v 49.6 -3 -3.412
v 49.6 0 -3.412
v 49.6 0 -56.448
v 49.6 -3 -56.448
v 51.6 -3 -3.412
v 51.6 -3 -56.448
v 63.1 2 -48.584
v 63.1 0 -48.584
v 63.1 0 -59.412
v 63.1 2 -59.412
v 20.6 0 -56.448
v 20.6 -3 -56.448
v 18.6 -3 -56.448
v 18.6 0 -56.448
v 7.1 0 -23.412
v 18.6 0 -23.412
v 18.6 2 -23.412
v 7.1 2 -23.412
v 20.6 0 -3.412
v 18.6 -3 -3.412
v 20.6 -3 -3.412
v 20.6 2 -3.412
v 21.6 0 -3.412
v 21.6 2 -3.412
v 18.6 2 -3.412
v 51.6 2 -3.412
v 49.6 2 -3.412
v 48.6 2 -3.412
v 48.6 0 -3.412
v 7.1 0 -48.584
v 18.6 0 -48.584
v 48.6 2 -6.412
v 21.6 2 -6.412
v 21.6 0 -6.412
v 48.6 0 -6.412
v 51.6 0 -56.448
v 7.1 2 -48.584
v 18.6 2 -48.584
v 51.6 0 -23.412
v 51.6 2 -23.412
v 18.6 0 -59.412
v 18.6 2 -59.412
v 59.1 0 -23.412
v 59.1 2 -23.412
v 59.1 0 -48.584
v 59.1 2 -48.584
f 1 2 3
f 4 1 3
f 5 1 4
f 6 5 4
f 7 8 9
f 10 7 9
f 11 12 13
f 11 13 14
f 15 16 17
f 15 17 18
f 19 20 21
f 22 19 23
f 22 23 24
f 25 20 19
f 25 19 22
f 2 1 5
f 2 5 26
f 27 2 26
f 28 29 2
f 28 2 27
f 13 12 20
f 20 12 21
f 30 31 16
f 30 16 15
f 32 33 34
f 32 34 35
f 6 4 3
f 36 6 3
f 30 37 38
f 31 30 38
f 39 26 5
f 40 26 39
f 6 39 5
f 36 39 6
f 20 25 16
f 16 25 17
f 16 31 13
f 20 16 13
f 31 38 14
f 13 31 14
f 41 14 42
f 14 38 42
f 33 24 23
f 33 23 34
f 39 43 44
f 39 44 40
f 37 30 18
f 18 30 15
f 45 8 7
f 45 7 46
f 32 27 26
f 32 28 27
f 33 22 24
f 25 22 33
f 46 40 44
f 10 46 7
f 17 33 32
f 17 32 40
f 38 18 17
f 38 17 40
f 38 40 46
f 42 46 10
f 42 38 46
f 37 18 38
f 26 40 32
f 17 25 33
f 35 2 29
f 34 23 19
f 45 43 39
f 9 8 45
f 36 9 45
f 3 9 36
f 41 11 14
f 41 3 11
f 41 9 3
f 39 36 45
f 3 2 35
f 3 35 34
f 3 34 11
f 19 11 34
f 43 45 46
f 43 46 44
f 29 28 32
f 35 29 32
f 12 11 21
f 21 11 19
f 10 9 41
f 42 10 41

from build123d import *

# Parameters (mm, degrees)
SALIENTE_EXTRUIR1_DEPTH = 2
CROQUIS4_W              = 53.035898385
CROQUIS4_H              = 5
SALIENTE_EXTRUIR2_DEPTH = 2
CROQUIS5_W              = 53.035898385
CROQUIS5_H              = 5
SALIENTE_EXTRUIR3_DEPTH = 2
CROQUIS6_W              = 11.5
CROQUIS6_H              = 10.828307393
CROQUIS6_W_2            = 27
CROQUIS6_H_2            = 3
CORTAR_EXTRUIR1_DEPTH   = 10


with BuildPart() as part:
    # Croquis3 → Saliente-Extruir1 (new body)
    with BuildSketch(Plane(origin=(0, 0, 0), x_dir=(1, 0, 0), z_dir=(0, 1, 0))):
        Polygon((10.064101615, 59.412461498), (60.135898385, 59.412461498), (63.1, 59.412461498), (63.1, 56.448359883), (63.1, 48.584154105), (59.1, 48.584154105), (59.1, 23.412461498), (49.6, 23.412461498), (49.6, 3.412461498), (20.6, 3.412461498), (20.6, 23.412461498), (7.1, 23.412461498), (7.1, 56.448359883), (7.1, 59.412461498), align=None)
    extrude(amount=SALIENTE_EXTRUIR1_DEPTH)

    # Croquis4 → Saliente-Extruir2 (add)
    with BuildSketch(Plane.ZY.offset(-20.6)):
        with Locations((-29.930410691, -0.5)):
            Rectangle(CROQUIS4_W, CROQUIS4_H)
    extrude(amount=SALIENTE_EXTRUIR2_DEPTH)

    # Croquis5 → Saliente-Extruir3 (add)
    with BuildSketch(Plane(origin=(49.6, 0, 0), x_dir=(0, 0, -1), z_dir=(1, 0, 0))):
        with Locations((29.930410691, -0.5)):
            Rectangle(CROQUIS5_W, CROQUIS5_H)
    extrude(amount=SALIENTE_EXTRUIR3_DEPTH)

    # Croquis6 → Cortar-Extruir1 (cut)
    with BuildSketch(Plane(origin=(0, 2, 0), x_dir=(1, 0, 0), z_dir=(0, 1, 0))):
        with Locations((12.85, 53.998307802)):
            Rectangle(CROQUIS6_W, CROQUIS6_H)
        with Locations((35.1, 4.912461498)):
            Rectangle(CROQUIS6_W_2, CROQUIS6_H_2)
    extrude(amount=-CORTAR_EXTRUIR1_DEPTH, mode=Mode.SUBTRACT)


solid = part.part
